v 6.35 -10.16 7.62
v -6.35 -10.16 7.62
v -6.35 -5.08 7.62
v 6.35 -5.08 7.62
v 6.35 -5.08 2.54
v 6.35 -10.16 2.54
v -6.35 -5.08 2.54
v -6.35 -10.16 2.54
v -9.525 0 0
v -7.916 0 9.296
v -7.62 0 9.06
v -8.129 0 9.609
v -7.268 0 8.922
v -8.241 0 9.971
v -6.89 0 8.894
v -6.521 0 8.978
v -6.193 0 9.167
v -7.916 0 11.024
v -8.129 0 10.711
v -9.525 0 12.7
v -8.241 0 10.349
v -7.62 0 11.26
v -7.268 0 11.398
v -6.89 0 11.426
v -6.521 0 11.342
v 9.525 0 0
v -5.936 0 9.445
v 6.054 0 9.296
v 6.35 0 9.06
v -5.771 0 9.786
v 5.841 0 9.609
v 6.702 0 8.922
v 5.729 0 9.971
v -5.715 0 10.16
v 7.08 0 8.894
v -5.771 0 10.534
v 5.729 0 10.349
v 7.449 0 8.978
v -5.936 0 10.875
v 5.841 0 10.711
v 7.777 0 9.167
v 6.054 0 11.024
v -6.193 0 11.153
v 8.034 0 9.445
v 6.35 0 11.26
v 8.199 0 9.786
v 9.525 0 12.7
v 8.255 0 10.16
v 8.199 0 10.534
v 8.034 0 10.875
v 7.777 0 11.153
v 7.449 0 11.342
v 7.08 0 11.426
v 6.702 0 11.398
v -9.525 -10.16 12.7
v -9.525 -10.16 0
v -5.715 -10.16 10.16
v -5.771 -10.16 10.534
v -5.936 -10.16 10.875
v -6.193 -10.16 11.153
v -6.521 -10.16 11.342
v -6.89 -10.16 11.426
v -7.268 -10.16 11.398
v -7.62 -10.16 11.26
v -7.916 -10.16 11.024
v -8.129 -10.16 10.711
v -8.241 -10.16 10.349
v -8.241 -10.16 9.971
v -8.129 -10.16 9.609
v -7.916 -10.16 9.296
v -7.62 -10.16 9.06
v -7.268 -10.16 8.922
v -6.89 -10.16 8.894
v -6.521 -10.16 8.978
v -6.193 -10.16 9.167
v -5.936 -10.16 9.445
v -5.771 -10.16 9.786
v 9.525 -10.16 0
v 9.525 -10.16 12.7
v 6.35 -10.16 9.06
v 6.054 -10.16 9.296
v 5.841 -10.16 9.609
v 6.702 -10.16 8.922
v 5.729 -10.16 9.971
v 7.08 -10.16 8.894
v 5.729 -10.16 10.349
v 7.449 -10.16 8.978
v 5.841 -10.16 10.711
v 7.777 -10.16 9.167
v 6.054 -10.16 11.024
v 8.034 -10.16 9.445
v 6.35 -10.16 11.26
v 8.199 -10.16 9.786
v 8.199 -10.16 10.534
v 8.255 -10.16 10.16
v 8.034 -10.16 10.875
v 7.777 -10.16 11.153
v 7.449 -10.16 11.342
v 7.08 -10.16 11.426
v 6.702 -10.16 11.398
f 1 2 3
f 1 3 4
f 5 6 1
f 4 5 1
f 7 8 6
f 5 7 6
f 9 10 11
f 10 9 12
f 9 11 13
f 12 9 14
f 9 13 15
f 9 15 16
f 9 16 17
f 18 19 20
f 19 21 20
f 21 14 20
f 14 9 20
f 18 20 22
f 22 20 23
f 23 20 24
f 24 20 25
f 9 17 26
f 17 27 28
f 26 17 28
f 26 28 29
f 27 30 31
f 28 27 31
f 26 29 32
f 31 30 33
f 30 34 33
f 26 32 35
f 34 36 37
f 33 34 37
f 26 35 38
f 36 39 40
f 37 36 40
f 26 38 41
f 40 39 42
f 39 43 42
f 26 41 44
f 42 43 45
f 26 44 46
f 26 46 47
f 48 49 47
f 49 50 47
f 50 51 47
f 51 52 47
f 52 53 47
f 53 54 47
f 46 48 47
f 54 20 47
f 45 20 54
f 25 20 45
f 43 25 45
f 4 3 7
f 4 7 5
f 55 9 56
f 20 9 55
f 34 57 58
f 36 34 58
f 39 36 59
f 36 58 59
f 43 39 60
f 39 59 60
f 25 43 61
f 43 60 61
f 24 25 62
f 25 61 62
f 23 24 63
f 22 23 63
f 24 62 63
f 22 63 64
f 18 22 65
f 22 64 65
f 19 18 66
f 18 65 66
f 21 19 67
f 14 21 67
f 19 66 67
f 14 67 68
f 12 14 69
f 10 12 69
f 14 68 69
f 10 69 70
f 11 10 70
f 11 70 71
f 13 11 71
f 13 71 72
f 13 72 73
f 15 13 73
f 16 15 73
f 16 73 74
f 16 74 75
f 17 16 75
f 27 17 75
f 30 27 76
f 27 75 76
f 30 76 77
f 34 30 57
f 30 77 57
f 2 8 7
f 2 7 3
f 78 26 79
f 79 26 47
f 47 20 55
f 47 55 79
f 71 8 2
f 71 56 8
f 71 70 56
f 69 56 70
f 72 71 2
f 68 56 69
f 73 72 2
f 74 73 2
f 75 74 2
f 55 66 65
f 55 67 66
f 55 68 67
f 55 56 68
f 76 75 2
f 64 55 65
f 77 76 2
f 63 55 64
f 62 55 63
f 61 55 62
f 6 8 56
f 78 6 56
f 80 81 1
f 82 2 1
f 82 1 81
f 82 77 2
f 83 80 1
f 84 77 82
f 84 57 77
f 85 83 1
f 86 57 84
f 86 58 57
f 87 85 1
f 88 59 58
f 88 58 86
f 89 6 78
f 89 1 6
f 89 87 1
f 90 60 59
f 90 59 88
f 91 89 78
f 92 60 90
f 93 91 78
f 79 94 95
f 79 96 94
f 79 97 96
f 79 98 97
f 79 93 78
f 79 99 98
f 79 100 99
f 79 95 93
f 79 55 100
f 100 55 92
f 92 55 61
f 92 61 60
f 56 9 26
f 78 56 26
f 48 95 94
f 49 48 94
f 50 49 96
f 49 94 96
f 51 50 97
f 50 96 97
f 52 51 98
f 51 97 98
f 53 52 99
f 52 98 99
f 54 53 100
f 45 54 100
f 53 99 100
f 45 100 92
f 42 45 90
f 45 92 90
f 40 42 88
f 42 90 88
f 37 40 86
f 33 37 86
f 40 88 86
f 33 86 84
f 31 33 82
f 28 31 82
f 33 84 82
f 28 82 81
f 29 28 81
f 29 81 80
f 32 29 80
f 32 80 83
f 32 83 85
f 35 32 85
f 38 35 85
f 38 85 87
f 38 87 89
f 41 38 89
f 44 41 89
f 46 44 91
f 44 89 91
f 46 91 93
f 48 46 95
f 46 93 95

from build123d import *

# Parameters (mm, degrees)
F0_W     = 19.05
F0_H     = 12.7
F1_DEPTH = 10.16
F2_W     = 12.7
F2_H     = 5.08
F3_DEPTH = 5.08
F4_R     = 1.27
F5_DEPTH = 10.16


with BuildPart() as f1:
    # F0 (on Front) → F1 (new body)
    with BuildSketch(Plane.XZ):
        with Locations((0, 6.35)):
            Rectangle(F0_W, F0_H)
    extrude(amount=F1_DEPTH)

    # F2 (on face) → F3 (cut)
    with BuildSketch(Plane.XZ.offset(10.16)):
        with Locations((0, 5.08)):
            Rectangle(F2_W, F2_H)
    extrude(amount=-F3_DEPTH, mode=Mode.SUBTRACT)

    # F4 (on face) → F5 (cut)
    with BuildSketch(Plane.XZ.offset(10.16)):
        with Locations((6.985, 10.16)):
            Circle(F4_R)
        with Locations((-6.985, 10.16)):
            Circle(F4_R)
    extrude(amount=-F5_DEPTH, mode=Mode.SUBTRACT)


solid = f1.part
